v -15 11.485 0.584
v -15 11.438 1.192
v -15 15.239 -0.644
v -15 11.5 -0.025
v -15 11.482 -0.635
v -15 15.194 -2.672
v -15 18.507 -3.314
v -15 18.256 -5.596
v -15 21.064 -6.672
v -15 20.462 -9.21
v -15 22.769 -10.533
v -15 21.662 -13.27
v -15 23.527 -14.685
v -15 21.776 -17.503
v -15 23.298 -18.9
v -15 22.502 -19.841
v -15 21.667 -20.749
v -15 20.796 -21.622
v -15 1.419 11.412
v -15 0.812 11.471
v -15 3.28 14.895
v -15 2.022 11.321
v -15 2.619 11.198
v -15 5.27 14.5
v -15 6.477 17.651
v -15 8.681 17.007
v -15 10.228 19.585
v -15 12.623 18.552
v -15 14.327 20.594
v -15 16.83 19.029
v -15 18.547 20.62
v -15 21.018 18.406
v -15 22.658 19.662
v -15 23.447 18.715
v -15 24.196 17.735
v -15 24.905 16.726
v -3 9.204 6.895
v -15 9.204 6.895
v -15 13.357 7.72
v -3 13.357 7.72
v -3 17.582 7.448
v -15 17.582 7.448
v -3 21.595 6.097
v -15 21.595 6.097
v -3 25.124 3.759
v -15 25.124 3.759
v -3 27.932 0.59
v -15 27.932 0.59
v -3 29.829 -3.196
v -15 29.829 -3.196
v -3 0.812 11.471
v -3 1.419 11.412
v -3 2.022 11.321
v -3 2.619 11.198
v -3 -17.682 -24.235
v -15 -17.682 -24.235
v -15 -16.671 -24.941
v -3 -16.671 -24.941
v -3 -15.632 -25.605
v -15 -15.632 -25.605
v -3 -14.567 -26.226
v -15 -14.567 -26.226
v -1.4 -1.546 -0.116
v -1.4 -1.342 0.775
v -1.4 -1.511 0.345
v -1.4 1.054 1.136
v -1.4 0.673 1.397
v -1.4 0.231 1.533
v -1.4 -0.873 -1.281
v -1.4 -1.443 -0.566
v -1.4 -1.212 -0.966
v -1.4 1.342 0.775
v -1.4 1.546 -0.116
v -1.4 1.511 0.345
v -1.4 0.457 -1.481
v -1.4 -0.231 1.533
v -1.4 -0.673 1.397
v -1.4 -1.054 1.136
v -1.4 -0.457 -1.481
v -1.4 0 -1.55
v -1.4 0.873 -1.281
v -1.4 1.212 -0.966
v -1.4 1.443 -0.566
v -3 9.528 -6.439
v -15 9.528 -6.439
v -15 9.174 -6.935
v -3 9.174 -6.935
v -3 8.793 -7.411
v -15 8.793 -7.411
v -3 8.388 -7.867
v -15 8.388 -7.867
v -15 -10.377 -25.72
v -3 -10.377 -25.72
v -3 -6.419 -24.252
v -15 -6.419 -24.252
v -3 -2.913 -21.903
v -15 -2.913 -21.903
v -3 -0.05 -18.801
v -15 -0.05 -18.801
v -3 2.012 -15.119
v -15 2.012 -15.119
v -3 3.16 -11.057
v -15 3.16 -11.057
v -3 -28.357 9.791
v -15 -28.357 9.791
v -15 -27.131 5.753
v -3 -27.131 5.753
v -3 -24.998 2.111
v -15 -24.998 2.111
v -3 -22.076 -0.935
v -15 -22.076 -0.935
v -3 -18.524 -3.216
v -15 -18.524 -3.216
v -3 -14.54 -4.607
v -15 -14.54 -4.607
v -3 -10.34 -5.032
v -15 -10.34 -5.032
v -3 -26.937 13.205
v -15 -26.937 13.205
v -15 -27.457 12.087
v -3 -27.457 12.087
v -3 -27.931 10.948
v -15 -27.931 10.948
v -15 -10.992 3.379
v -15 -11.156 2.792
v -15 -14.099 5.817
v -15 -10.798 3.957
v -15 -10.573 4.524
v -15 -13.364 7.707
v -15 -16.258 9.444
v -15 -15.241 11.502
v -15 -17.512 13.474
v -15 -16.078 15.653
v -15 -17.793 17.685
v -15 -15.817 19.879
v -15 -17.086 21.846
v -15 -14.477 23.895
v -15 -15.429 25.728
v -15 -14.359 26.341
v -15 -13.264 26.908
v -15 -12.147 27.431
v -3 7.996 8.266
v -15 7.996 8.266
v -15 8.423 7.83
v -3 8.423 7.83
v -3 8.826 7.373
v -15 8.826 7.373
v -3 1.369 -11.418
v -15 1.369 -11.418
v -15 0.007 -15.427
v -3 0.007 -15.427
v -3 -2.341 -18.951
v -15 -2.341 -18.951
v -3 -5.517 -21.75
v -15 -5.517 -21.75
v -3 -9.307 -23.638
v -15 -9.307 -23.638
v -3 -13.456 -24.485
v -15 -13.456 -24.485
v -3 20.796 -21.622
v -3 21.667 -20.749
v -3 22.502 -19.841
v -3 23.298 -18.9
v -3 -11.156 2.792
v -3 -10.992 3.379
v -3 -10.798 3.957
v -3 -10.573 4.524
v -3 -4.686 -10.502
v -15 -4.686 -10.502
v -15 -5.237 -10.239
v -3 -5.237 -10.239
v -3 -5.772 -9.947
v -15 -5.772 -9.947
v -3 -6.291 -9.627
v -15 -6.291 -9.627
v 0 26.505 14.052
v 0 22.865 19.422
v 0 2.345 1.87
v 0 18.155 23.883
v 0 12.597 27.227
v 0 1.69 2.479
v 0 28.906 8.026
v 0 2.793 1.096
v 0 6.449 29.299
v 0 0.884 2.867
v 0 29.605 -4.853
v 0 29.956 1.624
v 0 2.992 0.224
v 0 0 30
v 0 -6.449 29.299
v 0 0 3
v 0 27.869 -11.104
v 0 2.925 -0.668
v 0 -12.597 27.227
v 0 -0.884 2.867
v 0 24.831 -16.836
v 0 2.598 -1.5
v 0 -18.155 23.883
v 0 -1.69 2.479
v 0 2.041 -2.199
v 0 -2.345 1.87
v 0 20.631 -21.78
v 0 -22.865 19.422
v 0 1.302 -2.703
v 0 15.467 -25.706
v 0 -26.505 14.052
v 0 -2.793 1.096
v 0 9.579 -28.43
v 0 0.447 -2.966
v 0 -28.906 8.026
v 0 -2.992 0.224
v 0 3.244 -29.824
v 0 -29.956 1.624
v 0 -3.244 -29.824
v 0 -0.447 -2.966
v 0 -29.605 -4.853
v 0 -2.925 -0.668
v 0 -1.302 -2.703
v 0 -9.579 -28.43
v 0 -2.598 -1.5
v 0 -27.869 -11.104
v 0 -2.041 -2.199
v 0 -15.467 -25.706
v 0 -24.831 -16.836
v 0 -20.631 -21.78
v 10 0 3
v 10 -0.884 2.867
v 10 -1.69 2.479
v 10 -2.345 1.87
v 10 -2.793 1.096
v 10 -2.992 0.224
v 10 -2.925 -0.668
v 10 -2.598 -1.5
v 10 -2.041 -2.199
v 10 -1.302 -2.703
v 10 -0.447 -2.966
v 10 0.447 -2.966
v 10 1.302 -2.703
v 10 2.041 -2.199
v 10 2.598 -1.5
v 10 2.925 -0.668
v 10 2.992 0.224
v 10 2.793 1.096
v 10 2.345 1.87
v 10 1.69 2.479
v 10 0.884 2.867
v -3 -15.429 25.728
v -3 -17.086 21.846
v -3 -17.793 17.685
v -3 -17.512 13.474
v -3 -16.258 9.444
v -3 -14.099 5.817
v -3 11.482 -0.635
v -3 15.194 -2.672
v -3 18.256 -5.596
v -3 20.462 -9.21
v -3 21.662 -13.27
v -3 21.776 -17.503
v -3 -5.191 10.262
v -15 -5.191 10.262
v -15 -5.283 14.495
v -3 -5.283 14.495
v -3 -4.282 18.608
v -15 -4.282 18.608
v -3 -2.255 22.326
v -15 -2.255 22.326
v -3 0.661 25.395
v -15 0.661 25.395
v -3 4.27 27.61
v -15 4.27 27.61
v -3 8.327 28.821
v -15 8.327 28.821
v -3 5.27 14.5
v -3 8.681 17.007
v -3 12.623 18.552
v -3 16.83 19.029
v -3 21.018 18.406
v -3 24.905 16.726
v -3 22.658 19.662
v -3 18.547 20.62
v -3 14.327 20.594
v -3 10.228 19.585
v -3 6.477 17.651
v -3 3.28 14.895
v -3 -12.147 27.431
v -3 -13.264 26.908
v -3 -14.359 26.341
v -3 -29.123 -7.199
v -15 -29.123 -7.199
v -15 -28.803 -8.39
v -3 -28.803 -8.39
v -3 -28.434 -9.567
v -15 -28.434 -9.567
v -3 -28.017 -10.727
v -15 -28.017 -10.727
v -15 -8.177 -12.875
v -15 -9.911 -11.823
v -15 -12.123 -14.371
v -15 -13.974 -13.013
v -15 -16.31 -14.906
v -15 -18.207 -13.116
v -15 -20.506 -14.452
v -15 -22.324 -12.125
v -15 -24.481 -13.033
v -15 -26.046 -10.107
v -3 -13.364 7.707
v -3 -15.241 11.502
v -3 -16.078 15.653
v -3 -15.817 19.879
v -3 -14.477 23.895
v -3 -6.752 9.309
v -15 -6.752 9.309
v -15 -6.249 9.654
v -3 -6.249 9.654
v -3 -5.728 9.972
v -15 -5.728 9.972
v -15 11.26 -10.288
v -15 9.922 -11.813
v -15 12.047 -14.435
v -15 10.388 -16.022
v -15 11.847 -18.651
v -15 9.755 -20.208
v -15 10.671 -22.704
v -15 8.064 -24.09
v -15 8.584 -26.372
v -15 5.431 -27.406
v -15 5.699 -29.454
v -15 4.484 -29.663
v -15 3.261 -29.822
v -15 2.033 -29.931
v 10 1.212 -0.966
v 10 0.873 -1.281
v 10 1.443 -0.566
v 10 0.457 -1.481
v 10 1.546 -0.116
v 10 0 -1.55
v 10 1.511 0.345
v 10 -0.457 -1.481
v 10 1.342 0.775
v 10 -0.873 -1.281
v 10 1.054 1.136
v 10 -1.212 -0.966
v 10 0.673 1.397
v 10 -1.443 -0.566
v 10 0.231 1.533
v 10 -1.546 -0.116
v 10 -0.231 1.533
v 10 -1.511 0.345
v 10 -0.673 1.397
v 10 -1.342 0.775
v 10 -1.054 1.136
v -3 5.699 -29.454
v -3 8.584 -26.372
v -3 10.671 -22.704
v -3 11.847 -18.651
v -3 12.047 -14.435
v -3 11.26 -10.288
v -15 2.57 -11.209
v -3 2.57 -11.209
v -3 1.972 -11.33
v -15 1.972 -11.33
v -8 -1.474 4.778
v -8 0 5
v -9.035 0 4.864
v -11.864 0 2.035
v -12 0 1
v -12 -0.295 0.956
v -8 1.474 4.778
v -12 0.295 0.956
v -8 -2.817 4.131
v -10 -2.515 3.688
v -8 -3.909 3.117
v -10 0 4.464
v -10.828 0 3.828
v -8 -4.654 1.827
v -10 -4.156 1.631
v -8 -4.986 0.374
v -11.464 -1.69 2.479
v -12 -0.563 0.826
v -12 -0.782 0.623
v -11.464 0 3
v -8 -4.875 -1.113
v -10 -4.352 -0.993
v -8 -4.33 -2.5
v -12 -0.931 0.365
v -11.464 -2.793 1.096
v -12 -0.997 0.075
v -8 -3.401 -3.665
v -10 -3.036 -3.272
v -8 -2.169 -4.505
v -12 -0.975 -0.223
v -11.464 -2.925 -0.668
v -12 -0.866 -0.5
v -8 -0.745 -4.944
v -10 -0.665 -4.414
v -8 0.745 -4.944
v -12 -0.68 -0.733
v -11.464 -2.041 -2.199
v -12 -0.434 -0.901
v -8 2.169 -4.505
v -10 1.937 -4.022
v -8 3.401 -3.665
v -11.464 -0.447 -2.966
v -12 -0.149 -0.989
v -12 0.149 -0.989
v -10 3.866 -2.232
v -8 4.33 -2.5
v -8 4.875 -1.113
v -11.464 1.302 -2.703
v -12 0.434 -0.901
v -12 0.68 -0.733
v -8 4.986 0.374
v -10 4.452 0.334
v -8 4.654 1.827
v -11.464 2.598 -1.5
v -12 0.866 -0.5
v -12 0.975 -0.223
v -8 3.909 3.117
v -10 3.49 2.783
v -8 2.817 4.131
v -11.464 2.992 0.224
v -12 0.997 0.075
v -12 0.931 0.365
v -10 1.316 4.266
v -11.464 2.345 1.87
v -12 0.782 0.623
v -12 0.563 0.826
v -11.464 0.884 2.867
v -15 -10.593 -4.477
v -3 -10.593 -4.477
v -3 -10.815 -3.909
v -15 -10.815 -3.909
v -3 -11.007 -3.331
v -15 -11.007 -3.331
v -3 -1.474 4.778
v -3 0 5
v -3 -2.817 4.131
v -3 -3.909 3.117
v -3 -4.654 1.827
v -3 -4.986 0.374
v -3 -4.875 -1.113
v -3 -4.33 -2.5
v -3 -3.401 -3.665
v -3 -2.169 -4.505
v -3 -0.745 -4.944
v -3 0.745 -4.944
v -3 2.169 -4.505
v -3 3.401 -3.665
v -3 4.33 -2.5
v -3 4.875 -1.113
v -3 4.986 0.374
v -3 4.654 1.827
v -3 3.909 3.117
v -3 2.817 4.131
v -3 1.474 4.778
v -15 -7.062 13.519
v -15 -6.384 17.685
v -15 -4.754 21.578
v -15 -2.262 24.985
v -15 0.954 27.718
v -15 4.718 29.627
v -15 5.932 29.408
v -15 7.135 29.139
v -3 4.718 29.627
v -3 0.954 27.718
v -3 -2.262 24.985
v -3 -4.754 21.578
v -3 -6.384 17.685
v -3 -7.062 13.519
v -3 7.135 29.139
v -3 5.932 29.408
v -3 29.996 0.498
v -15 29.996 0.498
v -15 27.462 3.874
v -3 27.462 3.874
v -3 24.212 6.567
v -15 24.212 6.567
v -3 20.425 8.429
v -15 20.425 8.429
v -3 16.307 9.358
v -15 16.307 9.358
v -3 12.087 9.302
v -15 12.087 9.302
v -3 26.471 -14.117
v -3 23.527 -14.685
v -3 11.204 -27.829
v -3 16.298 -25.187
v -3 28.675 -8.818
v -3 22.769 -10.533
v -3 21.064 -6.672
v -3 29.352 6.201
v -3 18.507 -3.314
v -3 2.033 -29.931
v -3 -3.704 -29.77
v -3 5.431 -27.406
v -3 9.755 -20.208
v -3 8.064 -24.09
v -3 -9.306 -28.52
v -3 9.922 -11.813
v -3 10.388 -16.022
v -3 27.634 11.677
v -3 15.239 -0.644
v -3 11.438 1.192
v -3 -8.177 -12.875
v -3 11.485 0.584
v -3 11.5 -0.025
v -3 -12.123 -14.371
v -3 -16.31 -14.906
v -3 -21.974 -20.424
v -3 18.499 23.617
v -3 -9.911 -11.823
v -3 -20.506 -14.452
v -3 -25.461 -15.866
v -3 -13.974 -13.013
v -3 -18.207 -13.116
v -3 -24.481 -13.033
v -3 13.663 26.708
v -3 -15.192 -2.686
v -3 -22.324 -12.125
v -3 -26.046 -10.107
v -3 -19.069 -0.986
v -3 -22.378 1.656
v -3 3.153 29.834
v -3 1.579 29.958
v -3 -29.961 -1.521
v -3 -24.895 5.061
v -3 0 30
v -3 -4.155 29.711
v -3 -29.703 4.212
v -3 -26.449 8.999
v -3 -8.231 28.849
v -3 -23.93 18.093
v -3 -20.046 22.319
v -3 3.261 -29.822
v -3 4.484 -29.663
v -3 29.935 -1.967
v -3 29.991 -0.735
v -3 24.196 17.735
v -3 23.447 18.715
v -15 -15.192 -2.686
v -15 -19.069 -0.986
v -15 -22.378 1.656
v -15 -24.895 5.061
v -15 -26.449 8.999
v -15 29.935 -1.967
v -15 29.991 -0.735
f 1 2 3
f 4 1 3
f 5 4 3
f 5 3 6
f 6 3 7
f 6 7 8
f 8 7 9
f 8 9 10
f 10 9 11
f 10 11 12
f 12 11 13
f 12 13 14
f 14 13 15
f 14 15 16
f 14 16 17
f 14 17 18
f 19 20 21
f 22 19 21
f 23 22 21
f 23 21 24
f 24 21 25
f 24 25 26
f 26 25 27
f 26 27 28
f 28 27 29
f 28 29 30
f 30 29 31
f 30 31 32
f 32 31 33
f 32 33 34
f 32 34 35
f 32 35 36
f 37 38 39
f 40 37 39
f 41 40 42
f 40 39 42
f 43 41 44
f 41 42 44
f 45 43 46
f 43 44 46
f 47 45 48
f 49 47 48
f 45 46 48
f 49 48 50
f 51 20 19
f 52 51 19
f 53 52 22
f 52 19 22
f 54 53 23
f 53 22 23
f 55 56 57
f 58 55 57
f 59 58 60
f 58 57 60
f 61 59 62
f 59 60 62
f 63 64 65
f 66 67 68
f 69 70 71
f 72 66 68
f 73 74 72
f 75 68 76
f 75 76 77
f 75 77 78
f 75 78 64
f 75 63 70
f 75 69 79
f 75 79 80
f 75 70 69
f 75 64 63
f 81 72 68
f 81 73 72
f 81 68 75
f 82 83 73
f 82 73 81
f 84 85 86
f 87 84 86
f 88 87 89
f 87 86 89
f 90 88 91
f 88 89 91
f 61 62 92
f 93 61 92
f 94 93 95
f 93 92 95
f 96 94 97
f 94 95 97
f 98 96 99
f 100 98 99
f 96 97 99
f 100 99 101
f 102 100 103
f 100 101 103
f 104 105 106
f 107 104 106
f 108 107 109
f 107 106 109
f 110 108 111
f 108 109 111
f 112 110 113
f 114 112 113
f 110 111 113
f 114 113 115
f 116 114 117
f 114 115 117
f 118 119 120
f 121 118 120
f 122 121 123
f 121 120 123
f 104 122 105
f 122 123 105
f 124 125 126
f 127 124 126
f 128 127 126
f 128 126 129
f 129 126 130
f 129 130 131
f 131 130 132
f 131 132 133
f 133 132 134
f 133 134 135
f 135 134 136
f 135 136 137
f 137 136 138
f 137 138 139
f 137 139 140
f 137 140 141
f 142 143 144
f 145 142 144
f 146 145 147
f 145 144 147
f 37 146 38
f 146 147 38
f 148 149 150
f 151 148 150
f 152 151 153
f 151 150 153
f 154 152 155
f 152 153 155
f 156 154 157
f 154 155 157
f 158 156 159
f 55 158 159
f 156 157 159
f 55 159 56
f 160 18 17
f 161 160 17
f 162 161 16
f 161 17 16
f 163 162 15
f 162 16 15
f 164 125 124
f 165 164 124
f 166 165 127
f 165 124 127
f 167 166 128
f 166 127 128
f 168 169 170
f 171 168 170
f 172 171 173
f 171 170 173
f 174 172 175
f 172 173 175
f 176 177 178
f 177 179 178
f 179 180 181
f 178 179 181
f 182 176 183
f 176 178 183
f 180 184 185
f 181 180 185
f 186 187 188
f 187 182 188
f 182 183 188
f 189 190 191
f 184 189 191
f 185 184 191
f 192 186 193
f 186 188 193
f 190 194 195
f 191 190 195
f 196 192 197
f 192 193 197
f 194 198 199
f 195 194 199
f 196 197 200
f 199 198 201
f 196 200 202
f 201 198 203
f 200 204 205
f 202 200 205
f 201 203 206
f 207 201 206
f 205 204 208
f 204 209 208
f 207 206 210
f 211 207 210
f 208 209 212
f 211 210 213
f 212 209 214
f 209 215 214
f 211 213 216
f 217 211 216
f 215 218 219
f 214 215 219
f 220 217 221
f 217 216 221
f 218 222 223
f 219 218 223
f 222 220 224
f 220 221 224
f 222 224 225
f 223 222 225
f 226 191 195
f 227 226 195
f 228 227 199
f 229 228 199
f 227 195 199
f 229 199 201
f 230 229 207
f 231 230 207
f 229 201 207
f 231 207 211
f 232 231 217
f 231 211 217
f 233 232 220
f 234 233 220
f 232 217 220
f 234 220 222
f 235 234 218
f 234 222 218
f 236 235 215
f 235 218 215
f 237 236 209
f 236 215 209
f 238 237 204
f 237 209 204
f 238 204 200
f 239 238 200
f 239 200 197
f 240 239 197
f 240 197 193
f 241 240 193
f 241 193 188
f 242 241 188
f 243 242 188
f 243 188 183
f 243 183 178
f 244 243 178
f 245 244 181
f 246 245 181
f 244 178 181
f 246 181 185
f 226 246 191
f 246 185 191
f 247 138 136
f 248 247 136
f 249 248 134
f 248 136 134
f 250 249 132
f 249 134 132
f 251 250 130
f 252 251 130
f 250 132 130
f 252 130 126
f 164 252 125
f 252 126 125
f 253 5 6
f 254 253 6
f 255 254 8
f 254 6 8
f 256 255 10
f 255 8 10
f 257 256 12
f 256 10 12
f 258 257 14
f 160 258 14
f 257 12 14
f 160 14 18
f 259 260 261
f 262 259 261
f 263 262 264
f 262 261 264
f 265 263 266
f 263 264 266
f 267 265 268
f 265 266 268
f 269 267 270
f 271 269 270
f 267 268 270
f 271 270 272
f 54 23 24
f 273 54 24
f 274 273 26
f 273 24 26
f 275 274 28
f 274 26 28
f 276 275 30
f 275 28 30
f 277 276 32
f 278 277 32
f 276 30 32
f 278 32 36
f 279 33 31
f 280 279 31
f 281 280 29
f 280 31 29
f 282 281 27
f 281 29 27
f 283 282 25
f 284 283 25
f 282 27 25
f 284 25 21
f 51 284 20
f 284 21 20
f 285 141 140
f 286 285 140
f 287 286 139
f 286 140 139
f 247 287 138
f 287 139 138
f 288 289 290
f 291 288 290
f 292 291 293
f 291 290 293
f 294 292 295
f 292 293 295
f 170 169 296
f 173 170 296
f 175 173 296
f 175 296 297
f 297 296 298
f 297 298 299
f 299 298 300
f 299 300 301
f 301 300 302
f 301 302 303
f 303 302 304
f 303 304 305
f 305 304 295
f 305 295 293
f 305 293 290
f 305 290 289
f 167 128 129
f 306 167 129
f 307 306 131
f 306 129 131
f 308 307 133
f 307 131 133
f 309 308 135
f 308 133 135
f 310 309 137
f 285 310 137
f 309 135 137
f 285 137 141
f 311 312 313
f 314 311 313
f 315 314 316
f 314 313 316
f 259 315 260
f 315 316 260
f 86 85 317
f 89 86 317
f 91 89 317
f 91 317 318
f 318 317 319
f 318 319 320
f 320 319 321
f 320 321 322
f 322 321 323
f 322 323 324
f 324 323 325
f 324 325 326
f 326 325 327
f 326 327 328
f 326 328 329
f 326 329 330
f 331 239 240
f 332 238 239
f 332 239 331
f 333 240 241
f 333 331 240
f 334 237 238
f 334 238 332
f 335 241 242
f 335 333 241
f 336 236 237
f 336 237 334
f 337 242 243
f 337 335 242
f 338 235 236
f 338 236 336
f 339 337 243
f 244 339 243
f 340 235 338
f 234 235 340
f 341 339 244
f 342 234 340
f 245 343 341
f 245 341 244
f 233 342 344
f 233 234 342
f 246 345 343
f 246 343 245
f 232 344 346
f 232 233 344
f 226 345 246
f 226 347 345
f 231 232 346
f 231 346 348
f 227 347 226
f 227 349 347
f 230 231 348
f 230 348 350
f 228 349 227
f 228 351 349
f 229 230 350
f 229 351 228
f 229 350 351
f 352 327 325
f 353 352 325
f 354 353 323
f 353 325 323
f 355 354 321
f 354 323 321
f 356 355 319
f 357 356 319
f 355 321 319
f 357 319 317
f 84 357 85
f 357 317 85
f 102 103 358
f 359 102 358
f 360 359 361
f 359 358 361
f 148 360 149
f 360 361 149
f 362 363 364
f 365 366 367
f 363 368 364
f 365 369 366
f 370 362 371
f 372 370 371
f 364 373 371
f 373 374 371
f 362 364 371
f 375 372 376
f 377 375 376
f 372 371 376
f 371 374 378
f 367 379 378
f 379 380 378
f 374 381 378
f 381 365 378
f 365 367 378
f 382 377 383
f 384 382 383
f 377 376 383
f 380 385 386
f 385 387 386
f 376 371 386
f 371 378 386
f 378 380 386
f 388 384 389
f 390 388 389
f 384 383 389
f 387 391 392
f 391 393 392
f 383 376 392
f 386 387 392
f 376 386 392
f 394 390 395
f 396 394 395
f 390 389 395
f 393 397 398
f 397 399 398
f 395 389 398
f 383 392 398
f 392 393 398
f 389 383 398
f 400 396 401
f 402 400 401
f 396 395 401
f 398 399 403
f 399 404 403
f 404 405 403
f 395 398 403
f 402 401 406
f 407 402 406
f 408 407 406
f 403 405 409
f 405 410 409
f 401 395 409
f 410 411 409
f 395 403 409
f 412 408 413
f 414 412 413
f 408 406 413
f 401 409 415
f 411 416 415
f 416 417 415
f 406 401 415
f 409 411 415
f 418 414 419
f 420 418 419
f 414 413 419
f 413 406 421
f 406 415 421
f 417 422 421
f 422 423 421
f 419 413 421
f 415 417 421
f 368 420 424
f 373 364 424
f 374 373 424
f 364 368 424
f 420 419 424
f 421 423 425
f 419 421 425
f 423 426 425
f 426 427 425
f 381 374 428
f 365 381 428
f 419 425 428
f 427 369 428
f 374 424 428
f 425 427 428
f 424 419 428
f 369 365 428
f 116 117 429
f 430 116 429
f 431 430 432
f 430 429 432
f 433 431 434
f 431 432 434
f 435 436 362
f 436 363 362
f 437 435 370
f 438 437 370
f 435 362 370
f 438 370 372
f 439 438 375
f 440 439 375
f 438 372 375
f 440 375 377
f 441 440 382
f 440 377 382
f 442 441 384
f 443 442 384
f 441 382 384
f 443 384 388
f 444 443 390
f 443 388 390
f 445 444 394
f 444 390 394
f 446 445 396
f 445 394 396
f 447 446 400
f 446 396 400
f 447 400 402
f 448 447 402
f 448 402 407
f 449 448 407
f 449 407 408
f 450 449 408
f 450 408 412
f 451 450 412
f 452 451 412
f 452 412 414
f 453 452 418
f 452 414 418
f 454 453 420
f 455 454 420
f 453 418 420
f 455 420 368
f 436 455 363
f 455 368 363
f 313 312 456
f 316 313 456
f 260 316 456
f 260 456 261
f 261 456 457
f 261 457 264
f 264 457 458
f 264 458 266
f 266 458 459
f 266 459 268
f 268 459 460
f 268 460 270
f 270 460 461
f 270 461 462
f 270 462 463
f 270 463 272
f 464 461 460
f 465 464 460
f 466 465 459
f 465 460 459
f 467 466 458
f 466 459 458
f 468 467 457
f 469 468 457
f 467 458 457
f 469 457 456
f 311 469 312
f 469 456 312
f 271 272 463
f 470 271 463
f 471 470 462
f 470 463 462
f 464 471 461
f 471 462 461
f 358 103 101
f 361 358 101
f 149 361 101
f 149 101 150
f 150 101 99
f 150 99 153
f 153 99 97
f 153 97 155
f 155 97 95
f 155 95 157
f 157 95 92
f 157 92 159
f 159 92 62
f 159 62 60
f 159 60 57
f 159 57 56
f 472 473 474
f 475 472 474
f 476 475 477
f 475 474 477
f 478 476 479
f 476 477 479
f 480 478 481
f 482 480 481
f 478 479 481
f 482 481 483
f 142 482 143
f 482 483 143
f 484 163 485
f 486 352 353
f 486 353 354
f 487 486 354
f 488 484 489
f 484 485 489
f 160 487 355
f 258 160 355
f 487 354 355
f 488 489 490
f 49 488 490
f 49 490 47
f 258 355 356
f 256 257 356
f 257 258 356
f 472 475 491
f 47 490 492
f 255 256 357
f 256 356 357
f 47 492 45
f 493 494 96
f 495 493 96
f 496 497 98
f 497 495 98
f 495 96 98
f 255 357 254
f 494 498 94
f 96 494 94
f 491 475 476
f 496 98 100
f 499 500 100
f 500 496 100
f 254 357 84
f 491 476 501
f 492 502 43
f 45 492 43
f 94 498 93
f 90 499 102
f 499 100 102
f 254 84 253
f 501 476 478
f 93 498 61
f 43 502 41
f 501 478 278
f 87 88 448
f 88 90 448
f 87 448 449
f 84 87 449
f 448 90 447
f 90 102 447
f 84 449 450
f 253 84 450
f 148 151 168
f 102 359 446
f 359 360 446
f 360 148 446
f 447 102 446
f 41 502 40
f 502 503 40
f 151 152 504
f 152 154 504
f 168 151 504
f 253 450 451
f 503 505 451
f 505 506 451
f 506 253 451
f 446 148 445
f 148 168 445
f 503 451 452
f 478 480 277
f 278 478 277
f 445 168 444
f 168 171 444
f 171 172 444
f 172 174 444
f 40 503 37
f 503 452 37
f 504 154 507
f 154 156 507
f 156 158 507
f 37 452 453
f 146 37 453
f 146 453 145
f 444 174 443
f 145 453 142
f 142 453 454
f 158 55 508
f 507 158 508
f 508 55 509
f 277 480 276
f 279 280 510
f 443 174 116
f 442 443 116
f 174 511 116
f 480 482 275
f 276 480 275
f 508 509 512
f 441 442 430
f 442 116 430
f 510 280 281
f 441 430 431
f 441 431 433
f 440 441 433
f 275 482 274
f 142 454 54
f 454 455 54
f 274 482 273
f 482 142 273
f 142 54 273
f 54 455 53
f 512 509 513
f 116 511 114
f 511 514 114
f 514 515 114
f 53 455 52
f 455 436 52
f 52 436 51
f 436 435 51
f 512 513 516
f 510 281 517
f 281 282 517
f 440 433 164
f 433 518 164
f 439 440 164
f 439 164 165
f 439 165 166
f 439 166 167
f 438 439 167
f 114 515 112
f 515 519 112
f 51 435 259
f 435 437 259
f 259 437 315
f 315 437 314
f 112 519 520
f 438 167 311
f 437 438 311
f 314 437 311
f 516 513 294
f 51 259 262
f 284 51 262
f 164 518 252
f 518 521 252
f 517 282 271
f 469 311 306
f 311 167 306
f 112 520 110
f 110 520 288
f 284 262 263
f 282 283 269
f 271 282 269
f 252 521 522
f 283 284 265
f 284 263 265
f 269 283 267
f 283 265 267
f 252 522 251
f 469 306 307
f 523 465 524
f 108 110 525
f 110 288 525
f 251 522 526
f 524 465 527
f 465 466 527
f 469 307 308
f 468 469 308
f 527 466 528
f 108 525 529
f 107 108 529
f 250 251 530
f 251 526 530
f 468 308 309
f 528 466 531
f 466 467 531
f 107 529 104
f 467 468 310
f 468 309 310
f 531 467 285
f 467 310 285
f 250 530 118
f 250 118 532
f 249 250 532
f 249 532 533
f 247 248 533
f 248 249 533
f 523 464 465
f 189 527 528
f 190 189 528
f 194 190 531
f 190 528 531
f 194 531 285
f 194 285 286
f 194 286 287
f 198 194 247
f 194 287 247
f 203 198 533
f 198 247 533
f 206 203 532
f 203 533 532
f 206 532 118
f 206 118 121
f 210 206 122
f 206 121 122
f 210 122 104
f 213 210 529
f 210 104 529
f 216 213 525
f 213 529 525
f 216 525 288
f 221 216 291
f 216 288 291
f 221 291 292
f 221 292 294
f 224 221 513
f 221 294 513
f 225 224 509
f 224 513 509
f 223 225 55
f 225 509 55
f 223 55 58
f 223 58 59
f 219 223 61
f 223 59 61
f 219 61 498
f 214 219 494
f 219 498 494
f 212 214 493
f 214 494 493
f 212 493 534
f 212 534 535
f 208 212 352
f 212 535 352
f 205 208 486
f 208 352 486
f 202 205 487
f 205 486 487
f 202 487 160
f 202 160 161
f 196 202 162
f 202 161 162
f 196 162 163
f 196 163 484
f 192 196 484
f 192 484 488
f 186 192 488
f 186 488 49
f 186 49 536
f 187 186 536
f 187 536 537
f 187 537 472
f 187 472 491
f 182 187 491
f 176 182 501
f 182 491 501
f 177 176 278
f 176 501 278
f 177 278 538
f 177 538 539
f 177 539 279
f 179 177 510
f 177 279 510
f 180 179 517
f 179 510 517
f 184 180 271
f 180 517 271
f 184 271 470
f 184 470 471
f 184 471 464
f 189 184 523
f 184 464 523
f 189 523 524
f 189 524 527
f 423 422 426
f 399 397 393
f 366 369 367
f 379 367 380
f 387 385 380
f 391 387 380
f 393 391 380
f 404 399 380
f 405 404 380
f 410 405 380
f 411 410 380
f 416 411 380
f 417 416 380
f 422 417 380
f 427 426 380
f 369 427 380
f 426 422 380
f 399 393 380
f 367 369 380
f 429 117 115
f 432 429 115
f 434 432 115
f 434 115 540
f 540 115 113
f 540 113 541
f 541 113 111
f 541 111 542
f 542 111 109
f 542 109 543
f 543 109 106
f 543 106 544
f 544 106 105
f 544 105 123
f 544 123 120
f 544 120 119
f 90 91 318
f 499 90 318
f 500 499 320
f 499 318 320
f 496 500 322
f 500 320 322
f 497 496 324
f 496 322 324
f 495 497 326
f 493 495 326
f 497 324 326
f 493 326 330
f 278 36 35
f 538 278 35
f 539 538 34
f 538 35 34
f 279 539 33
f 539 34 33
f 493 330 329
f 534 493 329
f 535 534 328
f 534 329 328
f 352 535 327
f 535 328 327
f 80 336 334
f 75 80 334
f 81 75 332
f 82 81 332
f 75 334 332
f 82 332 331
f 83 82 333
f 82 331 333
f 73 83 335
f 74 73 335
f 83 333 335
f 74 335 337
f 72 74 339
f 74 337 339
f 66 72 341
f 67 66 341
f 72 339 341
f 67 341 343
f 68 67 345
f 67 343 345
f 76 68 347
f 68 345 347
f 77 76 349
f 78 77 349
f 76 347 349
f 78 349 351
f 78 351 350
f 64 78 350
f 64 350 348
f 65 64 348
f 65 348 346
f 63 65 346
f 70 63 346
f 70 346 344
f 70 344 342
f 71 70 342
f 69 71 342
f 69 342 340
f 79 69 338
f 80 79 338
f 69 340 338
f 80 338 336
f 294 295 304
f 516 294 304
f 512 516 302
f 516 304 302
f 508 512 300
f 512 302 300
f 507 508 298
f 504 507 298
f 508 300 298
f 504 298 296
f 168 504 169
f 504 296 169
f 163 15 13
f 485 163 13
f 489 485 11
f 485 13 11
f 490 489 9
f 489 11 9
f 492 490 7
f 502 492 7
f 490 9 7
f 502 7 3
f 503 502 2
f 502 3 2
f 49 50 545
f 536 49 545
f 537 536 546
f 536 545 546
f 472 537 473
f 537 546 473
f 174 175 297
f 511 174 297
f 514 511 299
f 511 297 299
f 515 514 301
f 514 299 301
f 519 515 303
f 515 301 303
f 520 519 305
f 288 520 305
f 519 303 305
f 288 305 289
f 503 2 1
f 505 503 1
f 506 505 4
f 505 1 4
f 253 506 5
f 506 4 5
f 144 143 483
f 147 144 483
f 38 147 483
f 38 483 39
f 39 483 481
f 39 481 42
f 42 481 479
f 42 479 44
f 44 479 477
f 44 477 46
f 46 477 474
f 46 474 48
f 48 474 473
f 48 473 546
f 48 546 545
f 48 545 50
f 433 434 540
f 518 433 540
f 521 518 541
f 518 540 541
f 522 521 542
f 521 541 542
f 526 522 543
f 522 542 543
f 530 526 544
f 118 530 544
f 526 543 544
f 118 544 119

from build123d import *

# Parameters (mm, degrees)
SKETCH4_R           = 3
BOSS_EXTRUDE2_DEPTH = 10
SKETCH5_R           = 1.55
CUT_EXTRUDE1_DEPTH  = 11.4
BOSS_EXTRUDE3_START = 12
BOSS_EXTRUDE3_DEPTH = 12
CIRPATTERN2_COUNT   = 9


with BuildPart() as part:
    # Sketch1 → Revolve1 (revolve)
    with BuildSketch(Plane(origin=(0, 0, 0), x_dir=(1, 0, 0), z_dir=(0, 1, 0)), mode=Mode.PRIVATE) as revolve1_sk:
        with BuildLine():
            Line((0, 0), (0, 30))
            Line((0, 30), (-3, 30))
            Line((-3, 30), (-3, 5))
            Line((-3, 5), (-8, 5))
            ThreePointArc((-8, 5), (-10.828427125, 3.828427125), (-12, 1))
            Line((-12, 1), (-12, 0))
            Line((-12, 0), (0, 0))
        make_face()
    revolve(revolve1_sk.sketch.rotate(Axis((-12, 0, 0), (1, 0, 0)), 180), axis=Axis((-12, 0, 0), (1, 0, 0)))

    # Sketch4 → Boss-Extrude2 (add)
    with BuildSketch(Plane(origin=(0, 0, 0), x_dir=(0, 0, -1), z_dir=(1, 0, 0))):
        with Locations(Location((0, 0, 0), (0, 0, 180))):
            Circle(SKETCH4_R)
    extrude(amount=BOSS_EXTRUDE2_DEPTH)

    # Sketch5 → Cut-Extrude1 (cut)
    with BuildSketch(Plane(origin=(10, 0, 0), x_dir=(0, 0, -1), z_dir=(1, 0, 0))):
        Circle(SKETCH5_R)
    extrude(amount=-CUT_EXTRUDE1_DEPTH, mode=Mode.SUBTRACT)

    # Sketch6 → Boss-Extrude3 (add)
    with BuildSketch(Plane.ZY.offset(3).offset(BOSS_EXTRUDE3_START)):
        with BuildLine():
            ThreePointArc((8.265556015, 7.995660308), (7.604078802, 8.627165559), (6.89451328, 9.204112485))
            ThreePointArc((6.89451328, 9.204112485), (6.09737327, 21.594864355), (-3.195635958, 29.829312946))
            ThreePointArc((-3.195635958, 29.829312946), (-1.351457872, 29.969543901), (0.497856742, 29.995868693))
            ThreePointArc((0.497856742, 29.995868693), (8.428709352, 20.424655605), (8.265556015, 7.995660308))
        make_face()
    boss_extrude3 = extrude(amount=-BOSS_EXTRUDE3_DEPTH)

    # CirPattern2: Boss-Extrude3 ×9 about axis
    cirpattern2_axis = Axis((0, 0, 0), (1, 0, 0))
    for i in range(1, CIRPATTERN2_COUNT):
        add(boss_extrude3.rotate(cirpattern2_axis, i * 360 / CIRPATTERN2_COUNT))


solid = part.part
